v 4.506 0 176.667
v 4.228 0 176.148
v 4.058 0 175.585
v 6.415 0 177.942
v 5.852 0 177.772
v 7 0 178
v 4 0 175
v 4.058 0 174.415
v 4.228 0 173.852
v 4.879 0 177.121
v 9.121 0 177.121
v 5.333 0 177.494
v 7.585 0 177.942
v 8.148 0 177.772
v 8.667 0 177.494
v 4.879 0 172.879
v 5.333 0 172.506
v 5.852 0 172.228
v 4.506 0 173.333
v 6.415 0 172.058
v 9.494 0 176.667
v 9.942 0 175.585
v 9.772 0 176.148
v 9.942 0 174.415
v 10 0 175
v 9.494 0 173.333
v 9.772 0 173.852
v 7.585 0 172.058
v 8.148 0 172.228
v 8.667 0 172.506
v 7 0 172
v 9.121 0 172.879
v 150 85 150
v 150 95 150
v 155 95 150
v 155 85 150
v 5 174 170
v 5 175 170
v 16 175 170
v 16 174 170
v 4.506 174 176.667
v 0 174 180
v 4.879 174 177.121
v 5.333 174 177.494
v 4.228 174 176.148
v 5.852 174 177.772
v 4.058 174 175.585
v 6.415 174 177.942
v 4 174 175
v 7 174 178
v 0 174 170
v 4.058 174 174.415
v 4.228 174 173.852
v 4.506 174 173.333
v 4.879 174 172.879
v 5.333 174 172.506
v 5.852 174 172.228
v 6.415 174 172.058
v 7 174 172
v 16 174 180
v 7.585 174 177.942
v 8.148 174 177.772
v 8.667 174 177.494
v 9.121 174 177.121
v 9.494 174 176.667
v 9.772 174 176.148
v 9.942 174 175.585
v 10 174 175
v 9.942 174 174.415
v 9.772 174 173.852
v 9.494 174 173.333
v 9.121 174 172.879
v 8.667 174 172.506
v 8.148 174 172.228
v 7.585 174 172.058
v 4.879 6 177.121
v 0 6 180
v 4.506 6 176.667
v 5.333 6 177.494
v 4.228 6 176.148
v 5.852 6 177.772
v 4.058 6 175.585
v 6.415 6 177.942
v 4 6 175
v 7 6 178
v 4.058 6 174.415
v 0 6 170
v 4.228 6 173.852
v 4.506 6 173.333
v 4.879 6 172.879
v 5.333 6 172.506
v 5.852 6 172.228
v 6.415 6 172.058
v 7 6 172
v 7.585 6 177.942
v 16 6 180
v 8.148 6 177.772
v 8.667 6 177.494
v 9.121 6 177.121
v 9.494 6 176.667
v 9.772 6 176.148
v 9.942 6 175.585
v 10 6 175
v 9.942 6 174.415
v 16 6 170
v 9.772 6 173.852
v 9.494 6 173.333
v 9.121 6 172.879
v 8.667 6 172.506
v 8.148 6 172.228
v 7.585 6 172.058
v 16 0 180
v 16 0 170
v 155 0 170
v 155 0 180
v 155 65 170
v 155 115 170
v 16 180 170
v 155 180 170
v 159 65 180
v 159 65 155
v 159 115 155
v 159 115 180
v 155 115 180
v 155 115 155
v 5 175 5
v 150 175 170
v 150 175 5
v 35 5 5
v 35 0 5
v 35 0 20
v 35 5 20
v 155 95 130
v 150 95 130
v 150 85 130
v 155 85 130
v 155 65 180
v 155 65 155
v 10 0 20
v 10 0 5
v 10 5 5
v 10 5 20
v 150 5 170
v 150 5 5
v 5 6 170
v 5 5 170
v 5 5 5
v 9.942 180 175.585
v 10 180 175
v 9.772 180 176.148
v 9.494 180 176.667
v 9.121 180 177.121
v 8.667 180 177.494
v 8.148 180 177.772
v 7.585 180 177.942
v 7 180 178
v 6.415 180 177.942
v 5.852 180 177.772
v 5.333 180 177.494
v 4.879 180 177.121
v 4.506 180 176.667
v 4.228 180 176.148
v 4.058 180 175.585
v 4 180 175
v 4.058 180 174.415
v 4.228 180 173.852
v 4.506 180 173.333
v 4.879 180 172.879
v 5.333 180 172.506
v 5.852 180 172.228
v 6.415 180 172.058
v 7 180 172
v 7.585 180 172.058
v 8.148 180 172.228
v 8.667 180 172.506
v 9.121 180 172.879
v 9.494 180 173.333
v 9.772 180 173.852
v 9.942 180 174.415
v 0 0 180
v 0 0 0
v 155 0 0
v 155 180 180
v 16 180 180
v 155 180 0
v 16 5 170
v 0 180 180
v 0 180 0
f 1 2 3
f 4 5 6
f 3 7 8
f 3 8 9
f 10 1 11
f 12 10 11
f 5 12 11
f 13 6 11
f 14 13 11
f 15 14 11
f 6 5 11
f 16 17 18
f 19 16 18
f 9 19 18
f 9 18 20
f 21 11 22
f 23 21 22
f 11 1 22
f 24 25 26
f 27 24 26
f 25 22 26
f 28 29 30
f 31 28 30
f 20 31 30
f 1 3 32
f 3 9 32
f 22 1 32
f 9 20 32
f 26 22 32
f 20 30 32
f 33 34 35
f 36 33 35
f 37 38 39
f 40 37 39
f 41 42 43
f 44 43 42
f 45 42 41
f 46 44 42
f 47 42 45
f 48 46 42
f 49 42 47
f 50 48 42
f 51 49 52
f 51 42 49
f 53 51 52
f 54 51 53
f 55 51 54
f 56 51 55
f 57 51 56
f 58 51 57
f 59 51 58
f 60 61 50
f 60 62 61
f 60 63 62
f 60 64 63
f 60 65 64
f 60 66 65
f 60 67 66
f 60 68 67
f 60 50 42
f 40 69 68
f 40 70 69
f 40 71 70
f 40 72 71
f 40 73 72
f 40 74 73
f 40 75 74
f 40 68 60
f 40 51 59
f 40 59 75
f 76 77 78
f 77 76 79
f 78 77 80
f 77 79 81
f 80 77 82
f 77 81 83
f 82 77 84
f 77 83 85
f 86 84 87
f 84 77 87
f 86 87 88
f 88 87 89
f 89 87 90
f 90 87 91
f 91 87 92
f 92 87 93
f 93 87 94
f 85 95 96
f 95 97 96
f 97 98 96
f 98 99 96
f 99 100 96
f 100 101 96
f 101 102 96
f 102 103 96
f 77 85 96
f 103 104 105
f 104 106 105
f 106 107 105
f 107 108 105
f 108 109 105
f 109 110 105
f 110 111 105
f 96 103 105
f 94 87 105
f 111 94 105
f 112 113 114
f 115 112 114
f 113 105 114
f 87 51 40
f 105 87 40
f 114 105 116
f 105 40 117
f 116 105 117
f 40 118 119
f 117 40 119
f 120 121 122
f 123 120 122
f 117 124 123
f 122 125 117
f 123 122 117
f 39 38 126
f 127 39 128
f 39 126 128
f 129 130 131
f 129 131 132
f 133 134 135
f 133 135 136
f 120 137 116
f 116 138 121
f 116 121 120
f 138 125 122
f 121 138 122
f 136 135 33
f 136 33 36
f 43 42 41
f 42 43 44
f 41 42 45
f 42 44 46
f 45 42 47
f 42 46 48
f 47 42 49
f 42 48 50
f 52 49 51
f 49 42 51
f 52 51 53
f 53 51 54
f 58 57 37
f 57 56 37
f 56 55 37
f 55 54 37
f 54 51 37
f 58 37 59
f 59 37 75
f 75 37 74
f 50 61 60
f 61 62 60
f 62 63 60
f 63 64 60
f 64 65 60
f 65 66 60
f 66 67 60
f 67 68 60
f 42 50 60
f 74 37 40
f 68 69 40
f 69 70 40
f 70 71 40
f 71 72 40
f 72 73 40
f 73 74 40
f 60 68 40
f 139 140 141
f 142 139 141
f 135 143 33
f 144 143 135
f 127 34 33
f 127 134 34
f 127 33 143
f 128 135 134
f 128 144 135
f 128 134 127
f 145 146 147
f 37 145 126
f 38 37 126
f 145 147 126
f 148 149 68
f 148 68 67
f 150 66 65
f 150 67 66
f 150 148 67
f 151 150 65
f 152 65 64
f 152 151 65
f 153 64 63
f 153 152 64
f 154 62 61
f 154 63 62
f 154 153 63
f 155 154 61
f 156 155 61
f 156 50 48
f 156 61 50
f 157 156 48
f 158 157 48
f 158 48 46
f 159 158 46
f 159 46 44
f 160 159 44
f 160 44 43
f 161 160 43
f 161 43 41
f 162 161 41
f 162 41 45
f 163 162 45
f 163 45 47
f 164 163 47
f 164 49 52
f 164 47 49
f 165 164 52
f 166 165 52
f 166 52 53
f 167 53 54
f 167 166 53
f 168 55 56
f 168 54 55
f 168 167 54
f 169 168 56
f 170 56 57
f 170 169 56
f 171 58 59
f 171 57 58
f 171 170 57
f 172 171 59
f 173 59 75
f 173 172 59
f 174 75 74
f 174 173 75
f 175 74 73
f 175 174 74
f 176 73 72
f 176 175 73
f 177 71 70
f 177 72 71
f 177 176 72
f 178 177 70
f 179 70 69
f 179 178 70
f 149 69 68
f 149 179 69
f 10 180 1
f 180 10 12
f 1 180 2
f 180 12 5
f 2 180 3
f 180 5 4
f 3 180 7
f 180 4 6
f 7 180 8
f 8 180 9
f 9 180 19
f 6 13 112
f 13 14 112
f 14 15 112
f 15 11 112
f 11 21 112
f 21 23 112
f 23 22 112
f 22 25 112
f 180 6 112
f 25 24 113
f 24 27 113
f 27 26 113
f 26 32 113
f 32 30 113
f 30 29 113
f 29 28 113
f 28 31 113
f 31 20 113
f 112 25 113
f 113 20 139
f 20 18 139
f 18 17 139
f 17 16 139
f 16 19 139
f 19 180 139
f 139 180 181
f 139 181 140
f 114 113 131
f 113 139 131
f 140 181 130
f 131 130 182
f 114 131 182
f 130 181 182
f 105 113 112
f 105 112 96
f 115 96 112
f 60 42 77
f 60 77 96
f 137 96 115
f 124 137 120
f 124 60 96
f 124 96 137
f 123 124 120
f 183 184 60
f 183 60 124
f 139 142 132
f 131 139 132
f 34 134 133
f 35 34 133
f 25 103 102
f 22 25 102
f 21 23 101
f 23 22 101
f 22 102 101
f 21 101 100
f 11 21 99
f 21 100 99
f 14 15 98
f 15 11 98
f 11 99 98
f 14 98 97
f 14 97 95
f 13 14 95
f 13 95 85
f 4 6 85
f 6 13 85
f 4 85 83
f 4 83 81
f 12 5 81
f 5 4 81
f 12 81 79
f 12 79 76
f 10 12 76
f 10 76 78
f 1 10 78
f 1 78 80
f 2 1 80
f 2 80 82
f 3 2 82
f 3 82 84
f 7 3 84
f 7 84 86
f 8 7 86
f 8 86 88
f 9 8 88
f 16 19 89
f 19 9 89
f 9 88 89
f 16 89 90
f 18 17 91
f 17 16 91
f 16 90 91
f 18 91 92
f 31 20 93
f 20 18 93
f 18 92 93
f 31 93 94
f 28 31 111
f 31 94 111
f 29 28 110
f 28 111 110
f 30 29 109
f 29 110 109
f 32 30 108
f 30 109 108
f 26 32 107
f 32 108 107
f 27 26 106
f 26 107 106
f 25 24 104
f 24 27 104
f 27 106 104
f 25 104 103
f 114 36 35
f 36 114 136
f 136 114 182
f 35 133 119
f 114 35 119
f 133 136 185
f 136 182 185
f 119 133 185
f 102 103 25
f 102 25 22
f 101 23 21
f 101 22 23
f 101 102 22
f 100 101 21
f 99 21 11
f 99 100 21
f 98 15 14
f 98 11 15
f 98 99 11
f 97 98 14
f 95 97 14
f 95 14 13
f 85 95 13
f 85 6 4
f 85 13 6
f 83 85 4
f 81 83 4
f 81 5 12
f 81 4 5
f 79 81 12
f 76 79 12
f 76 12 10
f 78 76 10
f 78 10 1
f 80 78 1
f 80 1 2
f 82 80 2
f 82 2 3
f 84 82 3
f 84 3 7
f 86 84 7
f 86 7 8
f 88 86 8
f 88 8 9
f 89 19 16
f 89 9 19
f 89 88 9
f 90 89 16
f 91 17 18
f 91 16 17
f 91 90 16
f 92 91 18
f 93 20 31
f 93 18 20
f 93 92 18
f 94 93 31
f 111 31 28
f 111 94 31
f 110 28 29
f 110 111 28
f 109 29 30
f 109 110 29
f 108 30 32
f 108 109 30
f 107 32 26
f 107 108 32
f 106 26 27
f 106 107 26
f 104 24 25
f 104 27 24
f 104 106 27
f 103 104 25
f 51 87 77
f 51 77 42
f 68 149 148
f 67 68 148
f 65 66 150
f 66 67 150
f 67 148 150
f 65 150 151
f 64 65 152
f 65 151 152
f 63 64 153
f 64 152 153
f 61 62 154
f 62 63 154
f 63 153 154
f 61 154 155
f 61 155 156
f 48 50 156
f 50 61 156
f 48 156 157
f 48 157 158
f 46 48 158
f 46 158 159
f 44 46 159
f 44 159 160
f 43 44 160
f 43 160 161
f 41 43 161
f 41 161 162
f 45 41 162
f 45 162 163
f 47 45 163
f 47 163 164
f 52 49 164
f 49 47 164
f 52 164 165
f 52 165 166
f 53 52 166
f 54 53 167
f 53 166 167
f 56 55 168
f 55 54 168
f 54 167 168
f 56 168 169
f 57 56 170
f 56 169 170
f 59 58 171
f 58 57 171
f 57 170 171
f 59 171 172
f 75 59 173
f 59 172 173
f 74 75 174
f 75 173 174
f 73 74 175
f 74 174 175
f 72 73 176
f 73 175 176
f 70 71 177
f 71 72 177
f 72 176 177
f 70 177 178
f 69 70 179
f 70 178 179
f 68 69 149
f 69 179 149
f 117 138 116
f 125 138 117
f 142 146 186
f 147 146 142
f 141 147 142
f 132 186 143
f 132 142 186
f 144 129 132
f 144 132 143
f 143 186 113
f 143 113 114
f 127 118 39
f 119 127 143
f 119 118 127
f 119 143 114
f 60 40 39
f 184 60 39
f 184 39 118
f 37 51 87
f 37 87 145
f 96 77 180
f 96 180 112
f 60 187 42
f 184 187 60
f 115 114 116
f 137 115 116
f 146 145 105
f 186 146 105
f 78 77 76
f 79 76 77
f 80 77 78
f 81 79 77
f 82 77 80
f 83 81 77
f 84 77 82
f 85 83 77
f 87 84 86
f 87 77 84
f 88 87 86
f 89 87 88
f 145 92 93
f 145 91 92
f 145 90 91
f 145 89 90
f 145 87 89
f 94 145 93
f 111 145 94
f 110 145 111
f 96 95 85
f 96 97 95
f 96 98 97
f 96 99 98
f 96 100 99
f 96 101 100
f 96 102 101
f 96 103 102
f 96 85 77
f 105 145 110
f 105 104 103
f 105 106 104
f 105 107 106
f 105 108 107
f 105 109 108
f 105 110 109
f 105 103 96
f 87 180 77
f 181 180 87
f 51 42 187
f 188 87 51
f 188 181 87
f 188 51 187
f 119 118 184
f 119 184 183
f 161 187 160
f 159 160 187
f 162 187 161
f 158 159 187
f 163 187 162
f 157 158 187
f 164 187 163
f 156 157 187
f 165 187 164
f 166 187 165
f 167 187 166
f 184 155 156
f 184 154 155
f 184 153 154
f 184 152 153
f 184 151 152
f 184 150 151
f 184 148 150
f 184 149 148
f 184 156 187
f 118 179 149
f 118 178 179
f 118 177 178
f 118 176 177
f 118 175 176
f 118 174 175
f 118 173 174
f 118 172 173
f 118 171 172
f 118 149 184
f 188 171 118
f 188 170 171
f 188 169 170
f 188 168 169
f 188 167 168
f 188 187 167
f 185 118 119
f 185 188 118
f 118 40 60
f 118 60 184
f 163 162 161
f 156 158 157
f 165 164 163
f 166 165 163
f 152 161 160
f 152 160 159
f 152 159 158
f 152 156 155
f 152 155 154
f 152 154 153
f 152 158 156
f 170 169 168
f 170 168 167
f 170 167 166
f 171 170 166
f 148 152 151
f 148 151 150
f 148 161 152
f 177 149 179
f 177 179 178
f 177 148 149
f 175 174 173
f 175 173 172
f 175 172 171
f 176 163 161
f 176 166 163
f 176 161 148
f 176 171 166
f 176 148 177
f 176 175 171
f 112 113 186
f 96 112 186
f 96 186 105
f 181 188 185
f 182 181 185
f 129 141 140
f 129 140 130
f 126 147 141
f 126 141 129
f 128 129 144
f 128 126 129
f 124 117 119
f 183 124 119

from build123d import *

# Parameters (mm, degrees)
CYLINDER001_R     = 3
CYLINDER001_DEPTH = 148
BOX007_W          = 16
BOX007_H          = 6
BOX007_DEPTH      = 10
CYLINDER_R        = 3
CYLINDER_DEPTH    = 148
BOX006_W          = 16
BOX006_H          = 6
BOX006_DEPTH      = 10
BOX005_W          = 12
BOX005_H          = 10
BOX005_DEPTH      = 20
BOX003_W          = 25
BOX003_H          = 25
BOX003_DEPTH      = 15
BOX001_W          = 145
BOX001_H          = 170
BOX001_DEPTH      = 200
BOX_W             = 155
BOX_H             = 180
BOX_DEPTH         = 170
BOX004_W          = 4
BOX004_H          = 50
BOX004_DEPTH      = 25
BOX002_W          = 155
BOX002_H          = 180
BOX002_DEPTH      = 10
CYLINDER003_R     = 3
CYLINDER003_DEPTH = 148
BOX013_W          = 16
BOX013_H          = 6
BOX013_DEPTH      = 10
CYLINDER002_R     = 3
CYLINDER002_DEPTH = 148
BOX012_W          = 16
BOX012_H          = 6
BOX012_DEPTH      = 10
BOX011_W          = 12
BOX011_H          = 10
BOX011_DEPTH      = 20
BOX010_W          = 25
BOX010_H          = 25
BOX010_DEPTH      = 15
BOX009_W          = 145
BOX009_H          = 170
BOX009_DEPTH      = 200
BOX008_W          = 155
BOX008_H          = 180
BOX008_DEPTH      = 170


with BuildPart() as cylinder001:
    # Cylinder001 → Cylinder001 (new body)
    with BuildSketch(Plane(origin=(7, 139, 175), x_dir=(1, 0, 0), z_dir=(0, -1, 0))):
        Circle(CYLINDER001_R)
    extrude(amount=CYLINDER001_DEPTH)


with BuildPart() as visagra2:
    # Box007 → Box007 (new body)
    with BuildSketch(Plane.XY.offset(170)):
        with Locations((8, 3)):
            Rectangle(BOX007_W, BOX007_H)
    extrude(amount=BOX007_DEPTH)

    # Cut004: cut Cylinder001
    add(cylinder001.part, mode=Mode.SUBTRACT)


with BuildPart() as cylinder:
    # Cylinder → Cylinder (new body)
    with BuildSketch(Plane(origin=(7, 192, 175), x_dir=(1, 0, 0), z_dir=(0, -1, 0))):
        Circle(CYLINDER_R)
    extrude(amount=CYLINDER_DEPTH)


with BuildPart() as visagra1:
    # Box006 → Box006 (new body)
    with BuildSketch(Plane(origin=(0, 174, 170), x_dir=(1, 0, 0), z_dir=(0, 0, 1))):
        with Locations((8, 3)):
            Rectangle(BOX006_W, BOX006_H)
    extrude(amount=BOX006_DEPTH)

    # Cut003: cut Cylinder
    add(cylinder.part, mode=Mode.SUBTRACT)


with BuildPart() as cube003:
    # Box005 → Box005 (new body)
    with BuildSketch(Plane(origin=(146, 85, 130), x_dir=(1, 0, 0), z_dir=(0, 0, 1))):
        with Locations((6, 5)):
            Rectangle(BOX005_W, BOX005_H)
    extrude(amount=BOX005_DEPTH)


with BuildPart() as agujero:
    # Box003 → Box003 (new body)
    with BuildSketch(Plane(origin=(10, -7, 5), x_dir=(1, 0, 0), z_dir=(0, 0, 1))):
        with Locations((12.5, 12.5)):
            Rectangle(BOX003_W, BOX003_H)
    extrude(amount=BOX003_DEPTH)


with BuildPart() as cube001:
    # Box001 → Box001 (new body)
    with BuildSketch(Plane(origin=(5, 5, 5), x_dir=(1, 0, 0), z_dir=(0, 0, 1))):
        with Locations((72.5, 85)):
            Rectangle(BOX001_W, BOX001_H)
    extrude(amount=BOX001_DEPTH)


with BuildPart() as fusion002:
    # Box → Box (new body)
    with BuildSketch(Plane.XY):
        with Locations((77.5, 90)):
            Rectangle(BOX_W, BOX_H)
    extrude(amount=BOX_DEPTH)

    # Cut: cut Cube001
    add(cube001.part, mode=Mode.SUBTRACT)

    # Cut001: cut Agujero
    add(agujero.part, mode=Mode.SUBTRACT)

    # Cut002: cut Cube003
    add(cube003.part, mode=Mode.SUBTRACT)

    # Fusion001: union visagra1
    add(visagra1.part)

    # Fusion002: union visagra2
    add(visagra2.part)


with BuildPart() as cube002:
    # Box004 → Box004 (new body)
    with BuildSketch(Plane(origin=(155, 65, 155), x_dir=(1, 0, 0), z_dir=(0, 0, 1))):
        with Locations((2, 25)):
            Rectangle(BOX004_W, BOX004_H)
    extrude(amount=BOX004_DEPTH)


with BuildPart() as tapa:
    # Box002 → Box002 (new body)
    with BuildSketch(Plane.XY.offset(170)):
        with Locations((77.5, 90)):
            Rectangle(BOX002_W, BOX002_H)
    extrude(amount=BOX002_DEPTH)

    # Fusion: union Cube002
    add(cube002.part)

    # Cut005: cut Fusion002
    add(fusion002.part, mode=Mode.SUBTRACT)


with BuildPart() as cylinder003:
    # Cylinder003 → Cylinder003 (new body)
    with BuildSketch(Plane(origin=(7, 139, 175), x_dir=(1, 0, 0), z_dir=(0, -1, 0))):
        Circle(CYLINDER003_R)
    extrude(amount=CYLINDER003_DEPTH)


with BuildPart() as visagra004:
    # Box013 → Box013 (new body)
    with BuildSketch(Plane.XY.offset(170)):
        with Locations((8, 3)):
            Rectangle(BOX013_W, BOX013_H)
    extrude(amount=BOX013_DEPTH)

    # Cut010: cut Cylinder003
    add(cylinder003.part, mode=Mode.SUBTRACT)


with BuildPart() as cylinder002:
    # Cylinder002 → Cylinder002 (new body)
    with BuildSketch(Plane(origin=(7, 192, 175), x_dir=(1, 0, 0), z_dir=(0, -1, 0))):
        Circle(CYLINDER002_R)
    extrude(amount=CYLINDER002_DEPTH)


with BuildPart() as visagra003:
    # Box012 → Box012 (new body)
    with BuildSketch(Plane(origin=(0, 174, 170), x_dir=(1, 0, 0), z_dir=(0, 0, 1))):
        with Locations((8, 3)):
            Rectangle(BOX012_W, BOX012_H)
    extrude(amount=BOX012_DEPTH)

    # Cut009: cut Cylinder002
    add(cylinder002.part, mode=Mode.SUBTRACT)


with BuildPart() as cube006:
    # Box011 → Box011 (new body)
    with BuildSketch(Plane(origin=(146, 85, 130), x_dir=(1, 0, 0), z_dir=(0, 0, 1))):
        with Locations((6, 5)):
            Rectangle(BOX011_W, BOX011_H)
    extrude(amount=BOX011_DEPTH)


with BuildPart() as agujero001:
    # Box010 → Box010 (new body)
    with BuildSketch(Plane(origin=(10, -7, 5), x_dir=(1, 0, 0), z_dir=(0, 0, 1))):
        with Locations((12.5, 12.5)):
            Rectangle(BOX010_W, BOX010_H)
    extrude(amount=BOX010_DEPTH)


with BuildPart() as cube005:
    # Box009 → Box009 (new body)
    with BuildSketch(Plane(origin=(5, 5, 5), x_dir=(1, 0, 0), z_dir=(0, 0, 1))):
        with Locations((72.5, 85)):
            Rectangle(BOX009_W, BOX009_H)
    extrude(amount=BOX009_DEPTH)


with BuildPart() as caja002:
    # Box008 → Box008 (new body)
    with BuildSketch(Plane.XY):
        with Locations((77.5, 90)):
            Rectangle(BOX008_W, BOX008_H)
    extrude(amount=BOX008_DEPTH)

    # Cut006: cut Cube005
    add(cube005.part, mode=Mode.SUBTRACT)

    # Cut007: cut Agujero001
    add(agujero001.part, mode=Mode.SUBTRACT)

    # Cut008: cut Cube006
    add(cube006.part, mode=Mode.SUBTRACT)

    # Fusion003: union visagra003
    add(visagra003.part)

    # Fusion004: union visagra004
    add(visagra004.part)


solid = Compound([tapa.part, caja002.part])
